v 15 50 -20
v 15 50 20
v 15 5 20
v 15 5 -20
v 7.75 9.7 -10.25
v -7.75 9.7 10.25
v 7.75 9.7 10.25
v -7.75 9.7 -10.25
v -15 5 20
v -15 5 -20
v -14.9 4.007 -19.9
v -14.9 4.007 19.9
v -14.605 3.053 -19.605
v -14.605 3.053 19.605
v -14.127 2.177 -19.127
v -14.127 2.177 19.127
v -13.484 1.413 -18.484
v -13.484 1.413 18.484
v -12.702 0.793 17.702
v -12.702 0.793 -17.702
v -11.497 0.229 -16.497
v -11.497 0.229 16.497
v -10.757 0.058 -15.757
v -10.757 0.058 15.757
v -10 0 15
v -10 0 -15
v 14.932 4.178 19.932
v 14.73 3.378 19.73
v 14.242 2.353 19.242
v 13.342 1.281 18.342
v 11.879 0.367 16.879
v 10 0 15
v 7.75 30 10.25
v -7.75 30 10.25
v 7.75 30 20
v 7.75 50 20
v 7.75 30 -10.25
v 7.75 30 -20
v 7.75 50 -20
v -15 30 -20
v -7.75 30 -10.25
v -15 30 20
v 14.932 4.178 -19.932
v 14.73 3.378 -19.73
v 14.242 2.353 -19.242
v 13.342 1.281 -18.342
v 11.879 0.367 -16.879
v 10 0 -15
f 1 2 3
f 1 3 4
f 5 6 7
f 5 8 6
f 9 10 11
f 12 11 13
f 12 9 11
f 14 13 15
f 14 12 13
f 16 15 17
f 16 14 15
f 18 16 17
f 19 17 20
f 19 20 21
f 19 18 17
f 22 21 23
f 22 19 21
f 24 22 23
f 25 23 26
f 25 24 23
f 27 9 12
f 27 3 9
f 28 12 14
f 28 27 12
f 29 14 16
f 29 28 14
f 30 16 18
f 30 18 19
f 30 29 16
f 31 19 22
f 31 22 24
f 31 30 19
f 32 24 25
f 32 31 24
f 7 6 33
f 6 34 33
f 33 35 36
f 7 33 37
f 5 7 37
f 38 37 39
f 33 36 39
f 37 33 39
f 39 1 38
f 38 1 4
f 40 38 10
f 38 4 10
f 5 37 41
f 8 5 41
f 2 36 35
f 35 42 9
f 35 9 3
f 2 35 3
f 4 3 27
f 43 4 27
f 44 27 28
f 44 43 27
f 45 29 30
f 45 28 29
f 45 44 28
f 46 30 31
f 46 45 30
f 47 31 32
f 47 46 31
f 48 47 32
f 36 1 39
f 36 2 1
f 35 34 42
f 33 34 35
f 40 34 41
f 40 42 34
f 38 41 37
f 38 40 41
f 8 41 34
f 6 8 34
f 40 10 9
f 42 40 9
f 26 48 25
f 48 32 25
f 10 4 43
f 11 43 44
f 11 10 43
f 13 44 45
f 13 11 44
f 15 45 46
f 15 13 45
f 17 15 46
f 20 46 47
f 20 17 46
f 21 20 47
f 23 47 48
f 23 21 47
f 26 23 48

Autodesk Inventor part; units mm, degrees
ref_plane "YZ Plane" through (0, 0, 0) normal (1, 0, 0) x (0, 1, 0)
ref_plane "XZ Plane" through (0, 0, 0) normal (0, 1, 0) x (-1, 0, 0)
ref_plane "XY Plane" through (0, 0, 0) normal (0, 0, 1) x (1, 0, 0)
sketch "Sketch1" plane through (0, 0, 0) normal (0, 1, 0) x (-1, 0, 0)
  line L0 (15, 20) -> (-15, 20)
  line L1 (-15, 20) -> (-15, -20)
  line L2 (-15, -20) -> (15, -20)
  line L3 (15, -20) -> (15, 20)
  line L4 (15, 20) -> (-15, -20) construction
  line L5 (-15, 20) -> (15, -20) construction
  point P0 (0, 0)
  dimension "d0" = 30
  dimension "d1" = 40
extrude "Extrusion1" add sketch "Sketch1" along normal blind 50
sketch "Sketch2" plane through (0, 50, 0) normal (0, 1, 0) x (1, 0, 0)
  line L0 (-7.75, -25.4) -> (7.75, -25.4)
  line L1 (7.75, -25.4) -> (7.75, 25.4)
  line L2 (7.75, 25.4) -> (-7.75, 25.4)
  line L3 (-7.75, 25.4) -> (-7.75, -25.4)
  line L4 (-7.75, -25.4) -> (7.75, 25.4) construction
  line L5 (7.75, -25.4) -> (-7.75, 25.4) construction
  point P0 (0, 0)
  dimension "d4" = 15.5
extrude "Extrusion2" cut sketch "Sketch2" against normal blind 20
sketch "Sketch3" plane through (0, 30, 0) normal (0, 1, 0) x (1, 0, 0)
  line L0 (-7.75, -10.25) -> (7.75, -10.25)
  line L1 (7.75, -10.25) -> (7.75, 10.25)
  line L2 (7.75, 10.25) -> (-7.75, 10.25)
  line L3 (-7.75, 10.25) -> (-7.75, -10.25)
  line L4 (-7.75, -10.25) -> (7.75, 10.25) construction
  line L5 (7.75, -10.25) -> (-7.75, 10.25) construction
  point P0 (0, 0)
  dimension "d7" = 15.5
  dimension "d8" = 20.5
extrude "Extrusion3" cut sketch "Sketch3" against normal blind 20.3
fillet "Fillet1" radius 5 4 edges at (15, 0, 0) (-15, 0, 0) (0, 0, 20) (0, 0, -20)
sketch "Sketch4" plane through (0, 50, 0) normal (0, 1, 0) x (1, 0, 0)
  line L0 (-7.75, -20) -> (-7.75, 20) projected
  line L1 (-7.75, 20) -> (-15, 20) projected
  line L2 (-15, 20) -> (-15, -20) projected
  line L3 (-15, -20) -> (-7.75, -20) projected
  point P0 (0, 0)
extrude "Extrusion4" cut sketch "Sketch4" against normal blind 20
properties part number "SEGURO DE GUIA DE TAPA PRINCIPAL"
